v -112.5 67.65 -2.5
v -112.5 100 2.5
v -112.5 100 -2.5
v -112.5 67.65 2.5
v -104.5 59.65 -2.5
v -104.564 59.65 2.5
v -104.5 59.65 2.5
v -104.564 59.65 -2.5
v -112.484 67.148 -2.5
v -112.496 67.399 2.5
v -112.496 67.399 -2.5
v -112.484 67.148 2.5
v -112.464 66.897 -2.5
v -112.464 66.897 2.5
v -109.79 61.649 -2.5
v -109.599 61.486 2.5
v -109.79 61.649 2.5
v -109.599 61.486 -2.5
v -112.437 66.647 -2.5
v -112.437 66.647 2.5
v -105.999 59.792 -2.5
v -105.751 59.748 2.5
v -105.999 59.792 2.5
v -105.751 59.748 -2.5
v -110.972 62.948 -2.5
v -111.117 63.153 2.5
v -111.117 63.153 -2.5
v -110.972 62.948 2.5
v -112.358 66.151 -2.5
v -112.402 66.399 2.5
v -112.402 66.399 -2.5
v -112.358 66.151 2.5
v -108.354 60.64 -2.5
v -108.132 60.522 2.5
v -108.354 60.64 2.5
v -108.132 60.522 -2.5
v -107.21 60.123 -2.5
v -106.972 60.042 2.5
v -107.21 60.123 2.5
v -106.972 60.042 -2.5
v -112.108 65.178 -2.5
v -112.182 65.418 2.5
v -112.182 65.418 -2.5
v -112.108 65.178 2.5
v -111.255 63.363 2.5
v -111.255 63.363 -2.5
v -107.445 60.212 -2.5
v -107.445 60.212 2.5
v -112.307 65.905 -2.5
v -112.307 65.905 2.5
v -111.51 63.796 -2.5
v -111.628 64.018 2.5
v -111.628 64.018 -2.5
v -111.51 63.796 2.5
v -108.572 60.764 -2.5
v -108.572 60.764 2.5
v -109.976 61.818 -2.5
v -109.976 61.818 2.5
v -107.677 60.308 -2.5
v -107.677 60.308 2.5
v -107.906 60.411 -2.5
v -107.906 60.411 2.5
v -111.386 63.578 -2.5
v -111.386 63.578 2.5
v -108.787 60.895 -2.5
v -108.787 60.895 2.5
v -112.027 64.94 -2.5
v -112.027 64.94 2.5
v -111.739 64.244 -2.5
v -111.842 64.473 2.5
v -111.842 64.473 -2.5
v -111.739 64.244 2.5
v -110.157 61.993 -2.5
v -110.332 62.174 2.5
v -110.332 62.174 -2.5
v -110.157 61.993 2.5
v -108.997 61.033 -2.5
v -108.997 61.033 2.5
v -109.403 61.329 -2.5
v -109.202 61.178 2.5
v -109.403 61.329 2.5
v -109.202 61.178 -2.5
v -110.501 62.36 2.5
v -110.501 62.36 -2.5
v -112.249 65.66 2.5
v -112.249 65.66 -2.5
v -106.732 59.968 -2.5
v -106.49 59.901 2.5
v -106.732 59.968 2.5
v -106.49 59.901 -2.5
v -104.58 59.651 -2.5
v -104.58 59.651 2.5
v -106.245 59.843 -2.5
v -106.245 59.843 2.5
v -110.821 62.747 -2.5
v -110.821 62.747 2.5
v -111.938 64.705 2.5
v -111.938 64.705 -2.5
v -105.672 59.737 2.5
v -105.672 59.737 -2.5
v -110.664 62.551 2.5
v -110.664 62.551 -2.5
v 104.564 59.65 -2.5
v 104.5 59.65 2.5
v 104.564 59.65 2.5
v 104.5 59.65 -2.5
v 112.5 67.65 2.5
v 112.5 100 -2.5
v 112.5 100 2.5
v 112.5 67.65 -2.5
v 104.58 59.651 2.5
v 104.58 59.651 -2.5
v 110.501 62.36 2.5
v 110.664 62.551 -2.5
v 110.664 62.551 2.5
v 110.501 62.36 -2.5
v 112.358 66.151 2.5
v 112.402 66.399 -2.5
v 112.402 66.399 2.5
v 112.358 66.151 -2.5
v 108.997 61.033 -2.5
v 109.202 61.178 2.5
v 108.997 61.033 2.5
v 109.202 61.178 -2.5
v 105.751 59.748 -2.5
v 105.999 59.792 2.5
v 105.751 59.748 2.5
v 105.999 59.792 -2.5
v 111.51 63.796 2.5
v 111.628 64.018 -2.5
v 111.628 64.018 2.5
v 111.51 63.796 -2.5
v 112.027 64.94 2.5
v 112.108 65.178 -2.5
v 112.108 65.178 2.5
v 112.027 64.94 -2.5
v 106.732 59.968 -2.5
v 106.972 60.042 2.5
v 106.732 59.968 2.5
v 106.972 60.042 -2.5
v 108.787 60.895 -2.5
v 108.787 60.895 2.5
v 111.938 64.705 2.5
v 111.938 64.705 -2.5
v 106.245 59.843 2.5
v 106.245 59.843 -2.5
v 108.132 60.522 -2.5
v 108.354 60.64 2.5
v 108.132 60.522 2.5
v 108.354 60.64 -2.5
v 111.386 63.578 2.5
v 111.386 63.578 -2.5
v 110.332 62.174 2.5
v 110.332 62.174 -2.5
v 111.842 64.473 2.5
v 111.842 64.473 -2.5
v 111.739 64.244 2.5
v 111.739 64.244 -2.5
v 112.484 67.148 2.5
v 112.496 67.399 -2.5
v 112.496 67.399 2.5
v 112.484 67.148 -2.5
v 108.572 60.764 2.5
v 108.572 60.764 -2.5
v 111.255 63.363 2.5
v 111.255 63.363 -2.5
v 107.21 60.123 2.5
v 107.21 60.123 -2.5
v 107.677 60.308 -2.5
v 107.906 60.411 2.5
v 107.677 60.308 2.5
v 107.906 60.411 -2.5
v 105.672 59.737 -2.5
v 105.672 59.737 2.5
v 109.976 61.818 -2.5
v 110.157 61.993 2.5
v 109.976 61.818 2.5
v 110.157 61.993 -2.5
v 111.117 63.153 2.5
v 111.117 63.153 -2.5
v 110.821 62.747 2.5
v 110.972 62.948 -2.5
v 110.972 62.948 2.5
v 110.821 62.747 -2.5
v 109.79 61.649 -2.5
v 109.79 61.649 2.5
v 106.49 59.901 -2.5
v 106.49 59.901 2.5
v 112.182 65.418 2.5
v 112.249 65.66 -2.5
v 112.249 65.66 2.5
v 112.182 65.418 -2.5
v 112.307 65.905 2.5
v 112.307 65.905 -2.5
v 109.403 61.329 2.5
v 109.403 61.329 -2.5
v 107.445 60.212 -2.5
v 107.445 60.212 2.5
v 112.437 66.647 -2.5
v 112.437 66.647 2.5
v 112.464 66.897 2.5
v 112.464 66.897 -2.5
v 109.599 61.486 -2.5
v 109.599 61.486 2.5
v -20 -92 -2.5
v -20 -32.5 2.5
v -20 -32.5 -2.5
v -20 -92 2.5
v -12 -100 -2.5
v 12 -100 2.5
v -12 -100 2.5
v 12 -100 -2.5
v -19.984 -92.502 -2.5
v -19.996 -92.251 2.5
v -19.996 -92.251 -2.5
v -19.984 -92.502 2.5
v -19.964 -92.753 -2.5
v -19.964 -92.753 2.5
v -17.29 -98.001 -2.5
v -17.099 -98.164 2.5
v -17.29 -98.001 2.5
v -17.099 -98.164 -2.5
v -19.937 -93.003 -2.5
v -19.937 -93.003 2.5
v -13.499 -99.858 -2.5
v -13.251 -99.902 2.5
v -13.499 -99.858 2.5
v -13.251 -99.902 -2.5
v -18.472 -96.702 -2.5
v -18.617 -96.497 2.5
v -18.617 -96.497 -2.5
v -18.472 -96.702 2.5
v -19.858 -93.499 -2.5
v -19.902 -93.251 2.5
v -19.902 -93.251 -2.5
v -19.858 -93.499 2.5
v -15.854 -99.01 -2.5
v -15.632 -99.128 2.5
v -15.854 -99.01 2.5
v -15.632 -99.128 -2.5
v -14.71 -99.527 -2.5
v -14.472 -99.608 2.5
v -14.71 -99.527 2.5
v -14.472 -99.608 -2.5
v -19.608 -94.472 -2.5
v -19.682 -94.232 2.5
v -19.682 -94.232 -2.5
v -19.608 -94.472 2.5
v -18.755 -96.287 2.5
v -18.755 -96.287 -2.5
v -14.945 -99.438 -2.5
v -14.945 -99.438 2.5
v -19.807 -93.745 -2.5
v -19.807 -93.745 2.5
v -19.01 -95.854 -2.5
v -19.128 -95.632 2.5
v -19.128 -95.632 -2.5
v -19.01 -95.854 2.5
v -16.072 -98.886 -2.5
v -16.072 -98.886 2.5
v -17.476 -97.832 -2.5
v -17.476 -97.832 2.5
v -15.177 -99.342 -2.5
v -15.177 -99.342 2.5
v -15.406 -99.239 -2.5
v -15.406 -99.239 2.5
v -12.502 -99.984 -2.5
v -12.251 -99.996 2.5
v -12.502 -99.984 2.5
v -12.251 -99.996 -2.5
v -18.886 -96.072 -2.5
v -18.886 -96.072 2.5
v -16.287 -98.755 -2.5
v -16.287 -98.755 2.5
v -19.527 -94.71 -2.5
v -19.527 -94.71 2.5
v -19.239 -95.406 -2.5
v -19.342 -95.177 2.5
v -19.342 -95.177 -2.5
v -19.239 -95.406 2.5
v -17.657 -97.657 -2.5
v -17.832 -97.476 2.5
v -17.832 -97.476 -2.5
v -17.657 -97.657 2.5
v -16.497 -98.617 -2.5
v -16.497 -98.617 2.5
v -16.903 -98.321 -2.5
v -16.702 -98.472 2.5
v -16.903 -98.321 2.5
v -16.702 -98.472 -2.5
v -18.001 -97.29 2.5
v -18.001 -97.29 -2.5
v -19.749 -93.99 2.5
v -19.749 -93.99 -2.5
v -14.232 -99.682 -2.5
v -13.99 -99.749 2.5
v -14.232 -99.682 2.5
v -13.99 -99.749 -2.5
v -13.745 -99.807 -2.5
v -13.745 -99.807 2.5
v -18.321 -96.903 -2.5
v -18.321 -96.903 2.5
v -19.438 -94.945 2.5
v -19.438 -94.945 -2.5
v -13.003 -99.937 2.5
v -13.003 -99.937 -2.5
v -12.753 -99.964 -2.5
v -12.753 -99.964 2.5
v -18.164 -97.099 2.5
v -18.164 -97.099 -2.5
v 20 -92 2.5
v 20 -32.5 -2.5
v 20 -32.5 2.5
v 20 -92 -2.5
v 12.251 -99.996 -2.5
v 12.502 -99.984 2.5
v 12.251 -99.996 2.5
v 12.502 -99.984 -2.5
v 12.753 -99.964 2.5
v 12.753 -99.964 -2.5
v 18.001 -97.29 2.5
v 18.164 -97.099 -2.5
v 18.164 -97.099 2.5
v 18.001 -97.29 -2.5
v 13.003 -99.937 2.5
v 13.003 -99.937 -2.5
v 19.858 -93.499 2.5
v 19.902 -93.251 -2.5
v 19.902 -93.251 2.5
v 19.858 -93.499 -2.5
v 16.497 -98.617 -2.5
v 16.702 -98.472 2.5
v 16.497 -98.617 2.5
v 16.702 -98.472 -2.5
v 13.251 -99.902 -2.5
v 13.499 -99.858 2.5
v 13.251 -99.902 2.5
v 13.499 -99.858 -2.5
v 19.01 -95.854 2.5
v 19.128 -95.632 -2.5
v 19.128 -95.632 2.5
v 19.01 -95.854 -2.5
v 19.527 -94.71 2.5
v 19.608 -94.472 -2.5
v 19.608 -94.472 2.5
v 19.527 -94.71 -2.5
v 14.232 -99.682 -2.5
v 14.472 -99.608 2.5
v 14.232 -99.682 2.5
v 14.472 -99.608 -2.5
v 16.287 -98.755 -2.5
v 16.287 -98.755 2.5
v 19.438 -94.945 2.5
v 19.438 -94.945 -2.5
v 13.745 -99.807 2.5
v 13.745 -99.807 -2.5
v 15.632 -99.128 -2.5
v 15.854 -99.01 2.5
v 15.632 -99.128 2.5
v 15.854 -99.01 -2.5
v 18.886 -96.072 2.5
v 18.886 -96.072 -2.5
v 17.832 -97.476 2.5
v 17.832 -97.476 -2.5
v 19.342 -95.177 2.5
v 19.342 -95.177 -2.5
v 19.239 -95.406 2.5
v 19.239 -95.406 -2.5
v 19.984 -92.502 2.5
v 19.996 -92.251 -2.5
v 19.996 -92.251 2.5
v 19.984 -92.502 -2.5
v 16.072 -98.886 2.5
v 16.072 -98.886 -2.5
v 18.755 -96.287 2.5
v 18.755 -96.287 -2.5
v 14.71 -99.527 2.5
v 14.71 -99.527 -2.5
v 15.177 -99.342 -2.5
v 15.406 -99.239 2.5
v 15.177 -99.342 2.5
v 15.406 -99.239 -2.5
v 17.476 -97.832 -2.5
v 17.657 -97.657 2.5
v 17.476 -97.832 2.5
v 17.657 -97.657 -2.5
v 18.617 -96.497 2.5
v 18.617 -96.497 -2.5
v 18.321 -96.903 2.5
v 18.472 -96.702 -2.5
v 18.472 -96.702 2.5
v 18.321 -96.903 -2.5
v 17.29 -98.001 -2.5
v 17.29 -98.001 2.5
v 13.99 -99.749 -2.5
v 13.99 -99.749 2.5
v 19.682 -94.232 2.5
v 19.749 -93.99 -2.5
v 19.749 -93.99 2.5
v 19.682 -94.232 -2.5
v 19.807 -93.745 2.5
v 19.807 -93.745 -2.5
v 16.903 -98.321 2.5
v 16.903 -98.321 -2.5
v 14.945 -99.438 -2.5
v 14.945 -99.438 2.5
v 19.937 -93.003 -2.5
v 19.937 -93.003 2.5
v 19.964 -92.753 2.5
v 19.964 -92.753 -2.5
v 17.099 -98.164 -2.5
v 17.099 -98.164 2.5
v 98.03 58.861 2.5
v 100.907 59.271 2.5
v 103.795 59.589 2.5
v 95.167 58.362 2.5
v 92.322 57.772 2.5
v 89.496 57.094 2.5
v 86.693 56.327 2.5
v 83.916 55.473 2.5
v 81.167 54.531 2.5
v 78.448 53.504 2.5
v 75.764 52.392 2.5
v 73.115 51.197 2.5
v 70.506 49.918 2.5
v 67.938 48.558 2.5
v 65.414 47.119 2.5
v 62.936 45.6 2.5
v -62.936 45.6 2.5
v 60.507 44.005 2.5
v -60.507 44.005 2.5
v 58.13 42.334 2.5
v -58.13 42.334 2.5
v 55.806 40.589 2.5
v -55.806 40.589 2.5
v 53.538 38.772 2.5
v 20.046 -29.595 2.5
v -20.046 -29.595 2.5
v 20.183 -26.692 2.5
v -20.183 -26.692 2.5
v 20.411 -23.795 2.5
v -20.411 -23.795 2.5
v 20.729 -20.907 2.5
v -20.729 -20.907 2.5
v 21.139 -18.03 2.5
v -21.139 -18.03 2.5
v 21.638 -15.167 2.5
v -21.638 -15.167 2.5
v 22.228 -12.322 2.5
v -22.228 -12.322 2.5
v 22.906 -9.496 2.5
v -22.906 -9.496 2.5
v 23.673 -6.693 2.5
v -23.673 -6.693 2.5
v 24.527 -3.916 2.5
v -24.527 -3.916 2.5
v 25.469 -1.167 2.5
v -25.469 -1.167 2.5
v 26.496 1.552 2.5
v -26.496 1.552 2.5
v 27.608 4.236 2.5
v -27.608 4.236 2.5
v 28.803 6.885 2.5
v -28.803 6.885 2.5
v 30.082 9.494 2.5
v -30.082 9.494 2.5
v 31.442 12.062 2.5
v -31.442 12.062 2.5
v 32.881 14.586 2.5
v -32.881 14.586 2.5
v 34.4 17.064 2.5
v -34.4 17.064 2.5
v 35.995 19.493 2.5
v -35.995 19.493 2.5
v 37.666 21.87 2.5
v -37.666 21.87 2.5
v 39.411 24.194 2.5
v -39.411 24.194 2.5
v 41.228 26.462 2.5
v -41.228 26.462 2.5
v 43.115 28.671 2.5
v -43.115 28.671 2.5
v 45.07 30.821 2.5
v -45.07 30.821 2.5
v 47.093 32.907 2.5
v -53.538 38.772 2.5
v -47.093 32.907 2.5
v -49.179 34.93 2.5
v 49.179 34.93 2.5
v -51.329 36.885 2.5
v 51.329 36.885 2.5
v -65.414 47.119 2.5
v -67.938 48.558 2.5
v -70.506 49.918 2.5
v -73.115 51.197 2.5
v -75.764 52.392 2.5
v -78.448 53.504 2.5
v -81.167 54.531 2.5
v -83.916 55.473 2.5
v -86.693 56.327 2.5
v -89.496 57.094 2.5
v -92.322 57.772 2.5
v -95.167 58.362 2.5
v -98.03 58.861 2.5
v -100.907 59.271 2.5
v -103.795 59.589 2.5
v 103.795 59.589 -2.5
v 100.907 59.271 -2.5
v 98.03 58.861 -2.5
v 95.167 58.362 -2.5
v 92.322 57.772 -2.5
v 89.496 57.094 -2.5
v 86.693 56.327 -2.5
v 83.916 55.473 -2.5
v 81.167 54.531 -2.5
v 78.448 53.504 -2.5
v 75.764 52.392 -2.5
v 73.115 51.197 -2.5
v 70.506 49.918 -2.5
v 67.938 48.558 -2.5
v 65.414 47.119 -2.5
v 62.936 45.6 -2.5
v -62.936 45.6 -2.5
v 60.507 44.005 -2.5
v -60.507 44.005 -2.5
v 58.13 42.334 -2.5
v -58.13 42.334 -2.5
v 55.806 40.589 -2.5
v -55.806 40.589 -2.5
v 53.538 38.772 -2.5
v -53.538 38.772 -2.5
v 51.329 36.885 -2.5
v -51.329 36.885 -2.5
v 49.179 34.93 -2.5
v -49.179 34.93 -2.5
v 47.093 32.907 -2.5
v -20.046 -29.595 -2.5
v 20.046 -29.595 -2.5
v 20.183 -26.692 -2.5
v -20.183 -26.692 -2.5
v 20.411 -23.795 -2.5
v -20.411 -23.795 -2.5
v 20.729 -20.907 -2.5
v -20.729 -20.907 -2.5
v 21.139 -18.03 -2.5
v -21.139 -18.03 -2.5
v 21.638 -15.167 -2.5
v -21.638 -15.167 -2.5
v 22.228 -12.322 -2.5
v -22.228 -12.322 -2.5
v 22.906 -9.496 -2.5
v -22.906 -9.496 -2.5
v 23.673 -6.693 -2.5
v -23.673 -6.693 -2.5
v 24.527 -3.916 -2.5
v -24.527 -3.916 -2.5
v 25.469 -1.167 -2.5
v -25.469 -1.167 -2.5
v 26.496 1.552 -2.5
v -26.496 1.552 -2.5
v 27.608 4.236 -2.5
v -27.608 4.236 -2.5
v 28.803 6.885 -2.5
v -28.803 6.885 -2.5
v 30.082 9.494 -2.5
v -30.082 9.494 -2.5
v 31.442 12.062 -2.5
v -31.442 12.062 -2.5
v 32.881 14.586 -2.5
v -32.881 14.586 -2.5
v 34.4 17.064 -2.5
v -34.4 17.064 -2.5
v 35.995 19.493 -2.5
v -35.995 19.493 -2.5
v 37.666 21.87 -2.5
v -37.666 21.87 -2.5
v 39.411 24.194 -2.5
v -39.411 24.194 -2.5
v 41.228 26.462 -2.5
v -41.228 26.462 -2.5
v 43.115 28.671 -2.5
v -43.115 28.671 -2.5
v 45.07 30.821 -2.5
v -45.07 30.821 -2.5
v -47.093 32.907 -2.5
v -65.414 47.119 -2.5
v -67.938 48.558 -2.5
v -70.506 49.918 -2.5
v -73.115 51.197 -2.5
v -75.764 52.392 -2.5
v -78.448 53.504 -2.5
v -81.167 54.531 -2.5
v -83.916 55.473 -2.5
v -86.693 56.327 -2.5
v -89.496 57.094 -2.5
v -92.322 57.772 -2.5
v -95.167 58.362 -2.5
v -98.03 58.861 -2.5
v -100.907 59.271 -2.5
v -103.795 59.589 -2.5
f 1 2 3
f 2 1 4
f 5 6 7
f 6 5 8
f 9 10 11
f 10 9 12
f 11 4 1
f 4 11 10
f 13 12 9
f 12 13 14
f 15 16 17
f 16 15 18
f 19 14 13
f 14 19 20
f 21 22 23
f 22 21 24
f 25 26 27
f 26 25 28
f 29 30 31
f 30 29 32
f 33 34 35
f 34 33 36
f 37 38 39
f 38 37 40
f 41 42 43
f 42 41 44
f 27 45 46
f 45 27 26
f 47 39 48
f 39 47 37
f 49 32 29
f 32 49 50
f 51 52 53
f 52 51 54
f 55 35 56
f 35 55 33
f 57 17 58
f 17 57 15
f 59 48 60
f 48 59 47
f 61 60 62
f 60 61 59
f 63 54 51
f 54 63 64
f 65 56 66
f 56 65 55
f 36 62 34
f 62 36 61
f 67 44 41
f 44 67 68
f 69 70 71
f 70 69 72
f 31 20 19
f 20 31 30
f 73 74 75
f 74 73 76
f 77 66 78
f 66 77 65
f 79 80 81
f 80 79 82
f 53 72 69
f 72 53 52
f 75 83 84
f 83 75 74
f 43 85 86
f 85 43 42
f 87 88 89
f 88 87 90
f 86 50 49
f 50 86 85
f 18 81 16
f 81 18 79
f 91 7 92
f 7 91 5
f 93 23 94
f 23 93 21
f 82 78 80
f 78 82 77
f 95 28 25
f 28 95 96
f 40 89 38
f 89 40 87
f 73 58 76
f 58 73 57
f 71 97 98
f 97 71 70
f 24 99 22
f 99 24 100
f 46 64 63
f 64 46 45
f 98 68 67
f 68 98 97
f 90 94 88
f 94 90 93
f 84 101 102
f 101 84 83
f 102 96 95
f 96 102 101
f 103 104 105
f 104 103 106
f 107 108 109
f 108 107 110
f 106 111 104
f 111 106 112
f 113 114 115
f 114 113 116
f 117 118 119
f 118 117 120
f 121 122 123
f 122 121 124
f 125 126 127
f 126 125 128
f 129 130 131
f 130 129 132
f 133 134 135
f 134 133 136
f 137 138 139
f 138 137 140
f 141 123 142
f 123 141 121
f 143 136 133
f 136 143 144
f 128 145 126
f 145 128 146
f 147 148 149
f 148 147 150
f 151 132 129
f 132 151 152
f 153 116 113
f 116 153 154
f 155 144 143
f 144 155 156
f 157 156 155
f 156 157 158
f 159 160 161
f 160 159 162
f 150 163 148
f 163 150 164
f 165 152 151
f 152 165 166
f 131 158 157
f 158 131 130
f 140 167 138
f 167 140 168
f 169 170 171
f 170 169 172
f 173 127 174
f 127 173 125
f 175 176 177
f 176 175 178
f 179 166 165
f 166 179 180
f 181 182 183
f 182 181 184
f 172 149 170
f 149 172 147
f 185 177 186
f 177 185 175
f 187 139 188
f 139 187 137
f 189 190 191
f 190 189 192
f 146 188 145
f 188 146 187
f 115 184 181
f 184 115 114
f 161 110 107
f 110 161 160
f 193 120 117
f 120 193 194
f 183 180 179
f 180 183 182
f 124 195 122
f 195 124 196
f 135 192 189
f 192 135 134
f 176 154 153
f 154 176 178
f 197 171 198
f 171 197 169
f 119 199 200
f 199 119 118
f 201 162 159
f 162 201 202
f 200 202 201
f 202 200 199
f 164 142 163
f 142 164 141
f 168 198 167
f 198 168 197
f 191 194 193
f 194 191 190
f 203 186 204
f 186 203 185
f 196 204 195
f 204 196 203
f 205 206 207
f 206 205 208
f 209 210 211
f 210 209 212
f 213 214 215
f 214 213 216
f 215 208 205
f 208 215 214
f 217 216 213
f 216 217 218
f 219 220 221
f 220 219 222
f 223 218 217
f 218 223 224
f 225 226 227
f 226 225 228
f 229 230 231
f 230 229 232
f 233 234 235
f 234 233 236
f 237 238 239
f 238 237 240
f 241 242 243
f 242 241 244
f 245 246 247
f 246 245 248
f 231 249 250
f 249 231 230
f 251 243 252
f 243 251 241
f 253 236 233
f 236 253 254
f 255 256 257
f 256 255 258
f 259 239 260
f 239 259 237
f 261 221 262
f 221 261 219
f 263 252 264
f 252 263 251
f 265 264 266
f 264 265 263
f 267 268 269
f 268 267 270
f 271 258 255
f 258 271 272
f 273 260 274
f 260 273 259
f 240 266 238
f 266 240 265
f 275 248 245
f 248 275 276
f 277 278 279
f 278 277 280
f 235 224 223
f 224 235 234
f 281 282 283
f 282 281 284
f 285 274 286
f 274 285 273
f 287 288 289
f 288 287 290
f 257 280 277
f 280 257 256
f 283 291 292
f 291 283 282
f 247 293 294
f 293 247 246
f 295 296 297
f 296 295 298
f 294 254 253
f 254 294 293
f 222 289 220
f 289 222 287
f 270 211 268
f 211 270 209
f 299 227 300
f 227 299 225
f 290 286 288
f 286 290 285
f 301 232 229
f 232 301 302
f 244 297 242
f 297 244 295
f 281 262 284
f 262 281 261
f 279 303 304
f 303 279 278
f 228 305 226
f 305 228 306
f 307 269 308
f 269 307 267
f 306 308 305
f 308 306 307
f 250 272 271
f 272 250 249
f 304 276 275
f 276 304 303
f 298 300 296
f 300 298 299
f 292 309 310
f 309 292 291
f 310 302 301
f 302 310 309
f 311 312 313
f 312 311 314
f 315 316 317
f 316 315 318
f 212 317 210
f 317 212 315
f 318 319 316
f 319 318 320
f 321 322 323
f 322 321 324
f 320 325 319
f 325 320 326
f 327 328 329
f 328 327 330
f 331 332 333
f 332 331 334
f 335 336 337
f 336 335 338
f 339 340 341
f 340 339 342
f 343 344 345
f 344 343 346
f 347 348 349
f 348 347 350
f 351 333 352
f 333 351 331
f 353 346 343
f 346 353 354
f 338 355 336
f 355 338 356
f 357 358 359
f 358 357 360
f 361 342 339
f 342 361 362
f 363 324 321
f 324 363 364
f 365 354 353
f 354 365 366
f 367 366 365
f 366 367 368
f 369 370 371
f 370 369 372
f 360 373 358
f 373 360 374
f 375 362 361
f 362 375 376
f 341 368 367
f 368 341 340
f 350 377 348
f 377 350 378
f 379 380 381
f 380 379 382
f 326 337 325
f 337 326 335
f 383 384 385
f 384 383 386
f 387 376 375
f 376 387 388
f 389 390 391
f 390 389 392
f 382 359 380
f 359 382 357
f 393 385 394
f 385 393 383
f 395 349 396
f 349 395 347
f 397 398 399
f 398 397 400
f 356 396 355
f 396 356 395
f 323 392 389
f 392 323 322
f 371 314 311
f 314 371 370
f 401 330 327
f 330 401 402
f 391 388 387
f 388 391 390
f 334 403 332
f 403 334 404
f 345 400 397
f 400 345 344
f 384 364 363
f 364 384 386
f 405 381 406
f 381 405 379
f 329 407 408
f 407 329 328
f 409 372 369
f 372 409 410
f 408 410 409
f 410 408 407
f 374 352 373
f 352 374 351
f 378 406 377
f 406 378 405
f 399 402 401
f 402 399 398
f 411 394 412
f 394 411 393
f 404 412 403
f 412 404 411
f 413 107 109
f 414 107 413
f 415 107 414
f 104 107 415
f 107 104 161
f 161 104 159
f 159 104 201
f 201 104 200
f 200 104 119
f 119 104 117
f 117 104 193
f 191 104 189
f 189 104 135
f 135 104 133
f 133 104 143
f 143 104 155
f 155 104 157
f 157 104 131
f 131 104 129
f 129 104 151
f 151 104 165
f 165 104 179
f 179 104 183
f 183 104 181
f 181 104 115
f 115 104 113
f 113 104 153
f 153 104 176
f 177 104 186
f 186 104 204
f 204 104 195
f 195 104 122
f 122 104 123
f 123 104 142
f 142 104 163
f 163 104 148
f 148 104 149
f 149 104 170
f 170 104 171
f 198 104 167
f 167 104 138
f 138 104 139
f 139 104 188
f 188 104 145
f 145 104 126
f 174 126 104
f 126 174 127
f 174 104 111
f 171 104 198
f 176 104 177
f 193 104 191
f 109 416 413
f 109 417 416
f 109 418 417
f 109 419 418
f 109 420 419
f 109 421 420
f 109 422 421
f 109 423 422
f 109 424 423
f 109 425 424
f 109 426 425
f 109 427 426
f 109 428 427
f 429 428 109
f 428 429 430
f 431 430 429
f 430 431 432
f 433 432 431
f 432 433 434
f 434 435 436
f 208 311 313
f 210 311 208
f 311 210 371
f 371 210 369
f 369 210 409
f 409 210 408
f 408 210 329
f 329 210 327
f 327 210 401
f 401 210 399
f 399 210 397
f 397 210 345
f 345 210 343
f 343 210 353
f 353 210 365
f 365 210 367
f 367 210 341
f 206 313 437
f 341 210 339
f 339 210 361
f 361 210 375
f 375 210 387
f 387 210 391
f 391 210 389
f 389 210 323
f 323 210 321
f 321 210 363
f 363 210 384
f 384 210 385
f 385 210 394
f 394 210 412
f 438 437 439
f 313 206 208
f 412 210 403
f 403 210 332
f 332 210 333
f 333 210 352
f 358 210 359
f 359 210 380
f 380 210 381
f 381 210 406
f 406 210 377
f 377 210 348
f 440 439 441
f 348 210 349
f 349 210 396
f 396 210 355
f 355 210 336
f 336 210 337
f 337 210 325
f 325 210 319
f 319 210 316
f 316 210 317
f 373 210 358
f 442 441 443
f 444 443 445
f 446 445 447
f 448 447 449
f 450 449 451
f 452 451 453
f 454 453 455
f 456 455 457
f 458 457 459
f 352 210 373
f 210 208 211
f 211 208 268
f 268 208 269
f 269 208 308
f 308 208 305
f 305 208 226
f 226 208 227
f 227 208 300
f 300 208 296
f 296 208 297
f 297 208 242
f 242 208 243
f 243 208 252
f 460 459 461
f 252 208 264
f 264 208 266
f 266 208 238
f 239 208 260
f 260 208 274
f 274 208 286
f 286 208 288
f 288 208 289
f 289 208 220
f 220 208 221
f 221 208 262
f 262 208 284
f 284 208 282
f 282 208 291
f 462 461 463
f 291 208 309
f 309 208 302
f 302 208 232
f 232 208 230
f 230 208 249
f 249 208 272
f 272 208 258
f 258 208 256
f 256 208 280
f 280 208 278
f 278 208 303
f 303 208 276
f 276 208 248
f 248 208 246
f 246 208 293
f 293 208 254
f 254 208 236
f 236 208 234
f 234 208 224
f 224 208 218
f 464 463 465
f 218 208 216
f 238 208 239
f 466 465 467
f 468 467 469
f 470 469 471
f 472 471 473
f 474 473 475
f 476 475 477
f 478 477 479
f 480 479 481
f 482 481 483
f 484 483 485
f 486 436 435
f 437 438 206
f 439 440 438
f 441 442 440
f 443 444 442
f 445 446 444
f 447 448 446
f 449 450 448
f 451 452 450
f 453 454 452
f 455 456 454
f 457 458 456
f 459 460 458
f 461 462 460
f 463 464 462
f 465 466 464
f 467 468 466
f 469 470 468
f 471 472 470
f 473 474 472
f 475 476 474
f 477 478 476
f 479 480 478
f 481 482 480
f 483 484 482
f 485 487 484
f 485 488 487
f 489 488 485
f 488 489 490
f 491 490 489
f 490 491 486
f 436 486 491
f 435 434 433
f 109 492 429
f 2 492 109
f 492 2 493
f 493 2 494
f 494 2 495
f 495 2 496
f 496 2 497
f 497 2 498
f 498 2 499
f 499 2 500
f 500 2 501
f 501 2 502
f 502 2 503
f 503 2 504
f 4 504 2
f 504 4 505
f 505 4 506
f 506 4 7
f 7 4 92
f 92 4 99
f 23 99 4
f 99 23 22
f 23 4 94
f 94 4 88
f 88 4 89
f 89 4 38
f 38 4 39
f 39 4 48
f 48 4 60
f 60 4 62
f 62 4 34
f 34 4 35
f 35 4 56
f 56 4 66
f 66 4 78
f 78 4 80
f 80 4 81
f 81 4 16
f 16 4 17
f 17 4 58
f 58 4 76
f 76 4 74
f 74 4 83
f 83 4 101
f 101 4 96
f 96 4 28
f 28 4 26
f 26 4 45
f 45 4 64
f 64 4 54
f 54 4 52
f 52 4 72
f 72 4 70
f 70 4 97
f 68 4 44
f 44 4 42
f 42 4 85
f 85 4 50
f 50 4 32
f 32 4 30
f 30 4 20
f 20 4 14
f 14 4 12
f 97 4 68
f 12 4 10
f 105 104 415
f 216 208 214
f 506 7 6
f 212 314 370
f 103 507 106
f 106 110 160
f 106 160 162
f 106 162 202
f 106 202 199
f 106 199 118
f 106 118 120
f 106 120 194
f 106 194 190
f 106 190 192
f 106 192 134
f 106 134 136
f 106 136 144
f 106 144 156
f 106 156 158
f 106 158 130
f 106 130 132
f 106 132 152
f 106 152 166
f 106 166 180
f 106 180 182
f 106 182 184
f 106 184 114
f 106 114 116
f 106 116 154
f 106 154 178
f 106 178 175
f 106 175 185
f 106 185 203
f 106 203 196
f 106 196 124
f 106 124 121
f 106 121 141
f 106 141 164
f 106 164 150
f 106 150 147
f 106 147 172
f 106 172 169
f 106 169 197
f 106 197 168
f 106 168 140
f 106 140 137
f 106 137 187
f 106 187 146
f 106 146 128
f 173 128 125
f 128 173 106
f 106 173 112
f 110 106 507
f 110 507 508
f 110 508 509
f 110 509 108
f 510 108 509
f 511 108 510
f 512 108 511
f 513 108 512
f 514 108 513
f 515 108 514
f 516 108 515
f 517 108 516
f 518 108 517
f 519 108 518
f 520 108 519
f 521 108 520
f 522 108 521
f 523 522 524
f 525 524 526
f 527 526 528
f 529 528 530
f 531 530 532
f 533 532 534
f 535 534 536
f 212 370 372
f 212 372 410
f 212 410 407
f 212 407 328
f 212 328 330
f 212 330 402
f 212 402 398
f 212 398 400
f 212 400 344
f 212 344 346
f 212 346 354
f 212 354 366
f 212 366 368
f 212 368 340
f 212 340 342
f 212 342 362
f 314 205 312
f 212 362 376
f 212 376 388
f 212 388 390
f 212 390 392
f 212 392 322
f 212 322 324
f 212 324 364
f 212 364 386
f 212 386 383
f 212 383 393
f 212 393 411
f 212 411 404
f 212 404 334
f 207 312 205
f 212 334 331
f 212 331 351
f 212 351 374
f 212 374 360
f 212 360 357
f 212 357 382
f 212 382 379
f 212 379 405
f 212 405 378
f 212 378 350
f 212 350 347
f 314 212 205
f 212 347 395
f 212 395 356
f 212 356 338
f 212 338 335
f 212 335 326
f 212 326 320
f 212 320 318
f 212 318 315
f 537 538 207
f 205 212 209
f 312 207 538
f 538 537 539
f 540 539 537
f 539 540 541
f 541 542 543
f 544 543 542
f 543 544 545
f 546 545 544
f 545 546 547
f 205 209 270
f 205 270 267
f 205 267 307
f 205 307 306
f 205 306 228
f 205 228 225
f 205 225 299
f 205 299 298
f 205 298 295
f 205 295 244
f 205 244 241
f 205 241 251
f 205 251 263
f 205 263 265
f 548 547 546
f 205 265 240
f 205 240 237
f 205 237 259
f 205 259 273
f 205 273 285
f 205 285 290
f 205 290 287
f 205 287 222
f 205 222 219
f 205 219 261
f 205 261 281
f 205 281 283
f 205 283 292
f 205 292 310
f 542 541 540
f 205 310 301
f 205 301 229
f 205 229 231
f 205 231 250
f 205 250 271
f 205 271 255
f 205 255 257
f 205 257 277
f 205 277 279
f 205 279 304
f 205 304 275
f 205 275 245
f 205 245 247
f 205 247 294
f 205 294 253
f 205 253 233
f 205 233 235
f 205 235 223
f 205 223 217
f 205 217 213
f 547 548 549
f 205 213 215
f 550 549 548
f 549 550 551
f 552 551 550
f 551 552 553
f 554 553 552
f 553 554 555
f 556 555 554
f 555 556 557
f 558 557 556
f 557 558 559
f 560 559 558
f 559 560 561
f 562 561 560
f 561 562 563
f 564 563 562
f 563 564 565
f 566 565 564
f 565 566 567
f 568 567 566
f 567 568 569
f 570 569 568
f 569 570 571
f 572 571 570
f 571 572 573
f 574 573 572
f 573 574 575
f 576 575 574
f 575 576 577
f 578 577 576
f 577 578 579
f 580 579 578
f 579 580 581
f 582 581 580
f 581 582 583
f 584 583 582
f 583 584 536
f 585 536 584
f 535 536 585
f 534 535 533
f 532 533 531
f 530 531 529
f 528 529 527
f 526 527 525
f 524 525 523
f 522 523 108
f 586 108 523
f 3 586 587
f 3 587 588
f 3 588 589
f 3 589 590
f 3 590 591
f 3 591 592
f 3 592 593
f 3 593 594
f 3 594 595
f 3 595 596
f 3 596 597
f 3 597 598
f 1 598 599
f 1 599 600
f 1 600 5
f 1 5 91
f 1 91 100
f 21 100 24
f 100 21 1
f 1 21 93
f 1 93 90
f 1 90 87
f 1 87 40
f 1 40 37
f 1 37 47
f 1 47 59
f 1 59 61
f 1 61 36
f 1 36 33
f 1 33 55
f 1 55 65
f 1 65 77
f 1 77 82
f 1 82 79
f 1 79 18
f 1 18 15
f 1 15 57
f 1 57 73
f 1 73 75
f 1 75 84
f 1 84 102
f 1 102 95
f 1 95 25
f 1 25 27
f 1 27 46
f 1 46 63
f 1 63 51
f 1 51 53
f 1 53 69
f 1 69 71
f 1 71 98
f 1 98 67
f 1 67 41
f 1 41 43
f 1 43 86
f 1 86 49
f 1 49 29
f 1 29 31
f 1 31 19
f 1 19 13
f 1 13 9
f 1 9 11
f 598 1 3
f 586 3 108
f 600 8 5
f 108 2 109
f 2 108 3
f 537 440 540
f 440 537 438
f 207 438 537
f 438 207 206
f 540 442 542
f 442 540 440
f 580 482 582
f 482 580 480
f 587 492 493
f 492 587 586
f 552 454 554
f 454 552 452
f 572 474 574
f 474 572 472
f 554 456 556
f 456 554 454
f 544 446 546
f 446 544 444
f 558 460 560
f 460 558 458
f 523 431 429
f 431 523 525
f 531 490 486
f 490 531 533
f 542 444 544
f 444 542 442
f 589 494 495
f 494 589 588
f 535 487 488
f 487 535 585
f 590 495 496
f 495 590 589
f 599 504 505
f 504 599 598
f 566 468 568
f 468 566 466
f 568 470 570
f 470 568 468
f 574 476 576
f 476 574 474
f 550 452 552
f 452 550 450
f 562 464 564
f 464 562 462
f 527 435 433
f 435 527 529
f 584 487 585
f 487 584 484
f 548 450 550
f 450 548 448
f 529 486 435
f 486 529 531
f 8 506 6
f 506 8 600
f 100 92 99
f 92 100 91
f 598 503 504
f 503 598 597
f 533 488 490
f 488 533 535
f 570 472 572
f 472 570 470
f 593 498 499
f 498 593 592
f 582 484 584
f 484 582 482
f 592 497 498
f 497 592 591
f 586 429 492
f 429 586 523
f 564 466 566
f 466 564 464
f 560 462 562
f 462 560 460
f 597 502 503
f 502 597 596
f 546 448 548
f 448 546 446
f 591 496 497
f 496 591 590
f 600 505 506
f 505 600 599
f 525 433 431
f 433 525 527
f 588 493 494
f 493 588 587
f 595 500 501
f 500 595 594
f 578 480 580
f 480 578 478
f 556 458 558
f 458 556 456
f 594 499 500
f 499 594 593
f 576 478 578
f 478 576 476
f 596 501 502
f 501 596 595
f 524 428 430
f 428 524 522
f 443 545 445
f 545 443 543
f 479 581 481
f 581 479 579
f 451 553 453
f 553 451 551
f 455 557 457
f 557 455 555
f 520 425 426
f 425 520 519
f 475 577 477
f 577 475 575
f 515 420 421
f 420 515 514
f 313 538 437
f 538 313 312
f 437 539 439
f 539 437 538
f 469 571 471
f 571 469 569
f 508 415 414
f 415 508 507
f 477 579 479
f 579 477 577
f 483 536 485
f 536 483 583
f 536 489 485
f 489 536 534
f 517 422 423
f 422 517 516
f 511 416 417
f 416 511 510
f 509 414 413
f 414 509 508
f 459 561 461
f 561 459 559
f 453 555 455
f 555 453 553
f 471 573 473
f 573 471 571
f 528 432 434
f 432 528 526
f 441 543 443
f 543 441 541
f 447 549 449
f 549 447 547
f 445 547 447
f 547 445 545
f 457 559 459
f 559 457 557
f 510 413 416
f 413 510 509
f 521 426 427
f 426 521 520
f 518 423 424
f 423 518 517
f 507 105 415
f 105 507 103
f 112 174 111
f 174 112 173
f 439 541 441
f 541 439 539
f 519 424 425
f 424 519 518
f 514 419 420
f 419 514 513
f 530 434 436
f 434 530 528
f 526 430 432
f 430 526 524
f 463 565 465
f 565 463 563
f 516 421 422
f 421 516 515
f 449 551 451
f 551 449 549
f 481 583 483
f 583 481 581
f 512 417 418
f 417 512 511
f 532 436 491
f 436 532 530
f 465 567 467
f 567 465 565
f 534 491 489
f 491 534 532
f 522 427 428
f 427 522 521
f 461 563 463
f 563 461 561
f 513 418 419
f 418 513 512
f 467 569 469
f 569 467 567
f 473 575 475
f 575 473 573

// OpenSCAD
$fn = 200;

handle_width = 40;
brush_width = 225;
brush_length = 200;
solid_length = 40;
brush_thickness = 5;
corner_radius = 8;

cutout_radius = brush_width / 2 - handle_width / 2;

module corner_cutout(x, y, radius, angle)
{
  translate([x, y, 0])
  rotate([0, 0, angle])
  translate([-radius, -radius, 0])
  difference()
  {
    translate([radius / 2, radius / 2, 0])
    cube([radius, radius, brush_thickness + 2], center = true);
    
    cylinder(brush_thickness + 2, r = radius, center = true);
  }
}

difference()
{
  cube([brush_width, brush_length, brush_thickness], center = true);

  translate([-brush_width / 2, brush_length / 2 - cutout_radius - solid_length, 0])
  cylinder(brush_thickness + 2, r = cutout_radius, center = true);
  translate([brush_width / 2, brush_length / 2 - cutout_radius - solid_length, 0])
  cylinder(brush_thickness + 2, r = cutout_radius, center = true);
  
  translate([-brush_width / 2 - handle_width / 2, -cutout_radius - solid_length, 0])
  cube([brush_width, brush_length, 2 + brush_thickness], center = true);
  translate([brush_width / 2 + handle_width / 2, -cutout_radius - solid_length, 0])
  cube([brush_width, brush_length, 2 + brush_thickness], center = true);
  
  corner_cutout(-brush_width / 2, brush_length / 2 - solid_length - 0.35, corner_radius, 180);
  corner_cutout(brush_width / 2, brush_length / 2 - solid_length - 0.35, corner_radius, 270);
  corner_cutout(-handle_width / 2, -brush_length / 2, corner_radius, 180);
  corner_cutout(handle_width / 2, -brush_length / 2, corner_radius, 270);
}
